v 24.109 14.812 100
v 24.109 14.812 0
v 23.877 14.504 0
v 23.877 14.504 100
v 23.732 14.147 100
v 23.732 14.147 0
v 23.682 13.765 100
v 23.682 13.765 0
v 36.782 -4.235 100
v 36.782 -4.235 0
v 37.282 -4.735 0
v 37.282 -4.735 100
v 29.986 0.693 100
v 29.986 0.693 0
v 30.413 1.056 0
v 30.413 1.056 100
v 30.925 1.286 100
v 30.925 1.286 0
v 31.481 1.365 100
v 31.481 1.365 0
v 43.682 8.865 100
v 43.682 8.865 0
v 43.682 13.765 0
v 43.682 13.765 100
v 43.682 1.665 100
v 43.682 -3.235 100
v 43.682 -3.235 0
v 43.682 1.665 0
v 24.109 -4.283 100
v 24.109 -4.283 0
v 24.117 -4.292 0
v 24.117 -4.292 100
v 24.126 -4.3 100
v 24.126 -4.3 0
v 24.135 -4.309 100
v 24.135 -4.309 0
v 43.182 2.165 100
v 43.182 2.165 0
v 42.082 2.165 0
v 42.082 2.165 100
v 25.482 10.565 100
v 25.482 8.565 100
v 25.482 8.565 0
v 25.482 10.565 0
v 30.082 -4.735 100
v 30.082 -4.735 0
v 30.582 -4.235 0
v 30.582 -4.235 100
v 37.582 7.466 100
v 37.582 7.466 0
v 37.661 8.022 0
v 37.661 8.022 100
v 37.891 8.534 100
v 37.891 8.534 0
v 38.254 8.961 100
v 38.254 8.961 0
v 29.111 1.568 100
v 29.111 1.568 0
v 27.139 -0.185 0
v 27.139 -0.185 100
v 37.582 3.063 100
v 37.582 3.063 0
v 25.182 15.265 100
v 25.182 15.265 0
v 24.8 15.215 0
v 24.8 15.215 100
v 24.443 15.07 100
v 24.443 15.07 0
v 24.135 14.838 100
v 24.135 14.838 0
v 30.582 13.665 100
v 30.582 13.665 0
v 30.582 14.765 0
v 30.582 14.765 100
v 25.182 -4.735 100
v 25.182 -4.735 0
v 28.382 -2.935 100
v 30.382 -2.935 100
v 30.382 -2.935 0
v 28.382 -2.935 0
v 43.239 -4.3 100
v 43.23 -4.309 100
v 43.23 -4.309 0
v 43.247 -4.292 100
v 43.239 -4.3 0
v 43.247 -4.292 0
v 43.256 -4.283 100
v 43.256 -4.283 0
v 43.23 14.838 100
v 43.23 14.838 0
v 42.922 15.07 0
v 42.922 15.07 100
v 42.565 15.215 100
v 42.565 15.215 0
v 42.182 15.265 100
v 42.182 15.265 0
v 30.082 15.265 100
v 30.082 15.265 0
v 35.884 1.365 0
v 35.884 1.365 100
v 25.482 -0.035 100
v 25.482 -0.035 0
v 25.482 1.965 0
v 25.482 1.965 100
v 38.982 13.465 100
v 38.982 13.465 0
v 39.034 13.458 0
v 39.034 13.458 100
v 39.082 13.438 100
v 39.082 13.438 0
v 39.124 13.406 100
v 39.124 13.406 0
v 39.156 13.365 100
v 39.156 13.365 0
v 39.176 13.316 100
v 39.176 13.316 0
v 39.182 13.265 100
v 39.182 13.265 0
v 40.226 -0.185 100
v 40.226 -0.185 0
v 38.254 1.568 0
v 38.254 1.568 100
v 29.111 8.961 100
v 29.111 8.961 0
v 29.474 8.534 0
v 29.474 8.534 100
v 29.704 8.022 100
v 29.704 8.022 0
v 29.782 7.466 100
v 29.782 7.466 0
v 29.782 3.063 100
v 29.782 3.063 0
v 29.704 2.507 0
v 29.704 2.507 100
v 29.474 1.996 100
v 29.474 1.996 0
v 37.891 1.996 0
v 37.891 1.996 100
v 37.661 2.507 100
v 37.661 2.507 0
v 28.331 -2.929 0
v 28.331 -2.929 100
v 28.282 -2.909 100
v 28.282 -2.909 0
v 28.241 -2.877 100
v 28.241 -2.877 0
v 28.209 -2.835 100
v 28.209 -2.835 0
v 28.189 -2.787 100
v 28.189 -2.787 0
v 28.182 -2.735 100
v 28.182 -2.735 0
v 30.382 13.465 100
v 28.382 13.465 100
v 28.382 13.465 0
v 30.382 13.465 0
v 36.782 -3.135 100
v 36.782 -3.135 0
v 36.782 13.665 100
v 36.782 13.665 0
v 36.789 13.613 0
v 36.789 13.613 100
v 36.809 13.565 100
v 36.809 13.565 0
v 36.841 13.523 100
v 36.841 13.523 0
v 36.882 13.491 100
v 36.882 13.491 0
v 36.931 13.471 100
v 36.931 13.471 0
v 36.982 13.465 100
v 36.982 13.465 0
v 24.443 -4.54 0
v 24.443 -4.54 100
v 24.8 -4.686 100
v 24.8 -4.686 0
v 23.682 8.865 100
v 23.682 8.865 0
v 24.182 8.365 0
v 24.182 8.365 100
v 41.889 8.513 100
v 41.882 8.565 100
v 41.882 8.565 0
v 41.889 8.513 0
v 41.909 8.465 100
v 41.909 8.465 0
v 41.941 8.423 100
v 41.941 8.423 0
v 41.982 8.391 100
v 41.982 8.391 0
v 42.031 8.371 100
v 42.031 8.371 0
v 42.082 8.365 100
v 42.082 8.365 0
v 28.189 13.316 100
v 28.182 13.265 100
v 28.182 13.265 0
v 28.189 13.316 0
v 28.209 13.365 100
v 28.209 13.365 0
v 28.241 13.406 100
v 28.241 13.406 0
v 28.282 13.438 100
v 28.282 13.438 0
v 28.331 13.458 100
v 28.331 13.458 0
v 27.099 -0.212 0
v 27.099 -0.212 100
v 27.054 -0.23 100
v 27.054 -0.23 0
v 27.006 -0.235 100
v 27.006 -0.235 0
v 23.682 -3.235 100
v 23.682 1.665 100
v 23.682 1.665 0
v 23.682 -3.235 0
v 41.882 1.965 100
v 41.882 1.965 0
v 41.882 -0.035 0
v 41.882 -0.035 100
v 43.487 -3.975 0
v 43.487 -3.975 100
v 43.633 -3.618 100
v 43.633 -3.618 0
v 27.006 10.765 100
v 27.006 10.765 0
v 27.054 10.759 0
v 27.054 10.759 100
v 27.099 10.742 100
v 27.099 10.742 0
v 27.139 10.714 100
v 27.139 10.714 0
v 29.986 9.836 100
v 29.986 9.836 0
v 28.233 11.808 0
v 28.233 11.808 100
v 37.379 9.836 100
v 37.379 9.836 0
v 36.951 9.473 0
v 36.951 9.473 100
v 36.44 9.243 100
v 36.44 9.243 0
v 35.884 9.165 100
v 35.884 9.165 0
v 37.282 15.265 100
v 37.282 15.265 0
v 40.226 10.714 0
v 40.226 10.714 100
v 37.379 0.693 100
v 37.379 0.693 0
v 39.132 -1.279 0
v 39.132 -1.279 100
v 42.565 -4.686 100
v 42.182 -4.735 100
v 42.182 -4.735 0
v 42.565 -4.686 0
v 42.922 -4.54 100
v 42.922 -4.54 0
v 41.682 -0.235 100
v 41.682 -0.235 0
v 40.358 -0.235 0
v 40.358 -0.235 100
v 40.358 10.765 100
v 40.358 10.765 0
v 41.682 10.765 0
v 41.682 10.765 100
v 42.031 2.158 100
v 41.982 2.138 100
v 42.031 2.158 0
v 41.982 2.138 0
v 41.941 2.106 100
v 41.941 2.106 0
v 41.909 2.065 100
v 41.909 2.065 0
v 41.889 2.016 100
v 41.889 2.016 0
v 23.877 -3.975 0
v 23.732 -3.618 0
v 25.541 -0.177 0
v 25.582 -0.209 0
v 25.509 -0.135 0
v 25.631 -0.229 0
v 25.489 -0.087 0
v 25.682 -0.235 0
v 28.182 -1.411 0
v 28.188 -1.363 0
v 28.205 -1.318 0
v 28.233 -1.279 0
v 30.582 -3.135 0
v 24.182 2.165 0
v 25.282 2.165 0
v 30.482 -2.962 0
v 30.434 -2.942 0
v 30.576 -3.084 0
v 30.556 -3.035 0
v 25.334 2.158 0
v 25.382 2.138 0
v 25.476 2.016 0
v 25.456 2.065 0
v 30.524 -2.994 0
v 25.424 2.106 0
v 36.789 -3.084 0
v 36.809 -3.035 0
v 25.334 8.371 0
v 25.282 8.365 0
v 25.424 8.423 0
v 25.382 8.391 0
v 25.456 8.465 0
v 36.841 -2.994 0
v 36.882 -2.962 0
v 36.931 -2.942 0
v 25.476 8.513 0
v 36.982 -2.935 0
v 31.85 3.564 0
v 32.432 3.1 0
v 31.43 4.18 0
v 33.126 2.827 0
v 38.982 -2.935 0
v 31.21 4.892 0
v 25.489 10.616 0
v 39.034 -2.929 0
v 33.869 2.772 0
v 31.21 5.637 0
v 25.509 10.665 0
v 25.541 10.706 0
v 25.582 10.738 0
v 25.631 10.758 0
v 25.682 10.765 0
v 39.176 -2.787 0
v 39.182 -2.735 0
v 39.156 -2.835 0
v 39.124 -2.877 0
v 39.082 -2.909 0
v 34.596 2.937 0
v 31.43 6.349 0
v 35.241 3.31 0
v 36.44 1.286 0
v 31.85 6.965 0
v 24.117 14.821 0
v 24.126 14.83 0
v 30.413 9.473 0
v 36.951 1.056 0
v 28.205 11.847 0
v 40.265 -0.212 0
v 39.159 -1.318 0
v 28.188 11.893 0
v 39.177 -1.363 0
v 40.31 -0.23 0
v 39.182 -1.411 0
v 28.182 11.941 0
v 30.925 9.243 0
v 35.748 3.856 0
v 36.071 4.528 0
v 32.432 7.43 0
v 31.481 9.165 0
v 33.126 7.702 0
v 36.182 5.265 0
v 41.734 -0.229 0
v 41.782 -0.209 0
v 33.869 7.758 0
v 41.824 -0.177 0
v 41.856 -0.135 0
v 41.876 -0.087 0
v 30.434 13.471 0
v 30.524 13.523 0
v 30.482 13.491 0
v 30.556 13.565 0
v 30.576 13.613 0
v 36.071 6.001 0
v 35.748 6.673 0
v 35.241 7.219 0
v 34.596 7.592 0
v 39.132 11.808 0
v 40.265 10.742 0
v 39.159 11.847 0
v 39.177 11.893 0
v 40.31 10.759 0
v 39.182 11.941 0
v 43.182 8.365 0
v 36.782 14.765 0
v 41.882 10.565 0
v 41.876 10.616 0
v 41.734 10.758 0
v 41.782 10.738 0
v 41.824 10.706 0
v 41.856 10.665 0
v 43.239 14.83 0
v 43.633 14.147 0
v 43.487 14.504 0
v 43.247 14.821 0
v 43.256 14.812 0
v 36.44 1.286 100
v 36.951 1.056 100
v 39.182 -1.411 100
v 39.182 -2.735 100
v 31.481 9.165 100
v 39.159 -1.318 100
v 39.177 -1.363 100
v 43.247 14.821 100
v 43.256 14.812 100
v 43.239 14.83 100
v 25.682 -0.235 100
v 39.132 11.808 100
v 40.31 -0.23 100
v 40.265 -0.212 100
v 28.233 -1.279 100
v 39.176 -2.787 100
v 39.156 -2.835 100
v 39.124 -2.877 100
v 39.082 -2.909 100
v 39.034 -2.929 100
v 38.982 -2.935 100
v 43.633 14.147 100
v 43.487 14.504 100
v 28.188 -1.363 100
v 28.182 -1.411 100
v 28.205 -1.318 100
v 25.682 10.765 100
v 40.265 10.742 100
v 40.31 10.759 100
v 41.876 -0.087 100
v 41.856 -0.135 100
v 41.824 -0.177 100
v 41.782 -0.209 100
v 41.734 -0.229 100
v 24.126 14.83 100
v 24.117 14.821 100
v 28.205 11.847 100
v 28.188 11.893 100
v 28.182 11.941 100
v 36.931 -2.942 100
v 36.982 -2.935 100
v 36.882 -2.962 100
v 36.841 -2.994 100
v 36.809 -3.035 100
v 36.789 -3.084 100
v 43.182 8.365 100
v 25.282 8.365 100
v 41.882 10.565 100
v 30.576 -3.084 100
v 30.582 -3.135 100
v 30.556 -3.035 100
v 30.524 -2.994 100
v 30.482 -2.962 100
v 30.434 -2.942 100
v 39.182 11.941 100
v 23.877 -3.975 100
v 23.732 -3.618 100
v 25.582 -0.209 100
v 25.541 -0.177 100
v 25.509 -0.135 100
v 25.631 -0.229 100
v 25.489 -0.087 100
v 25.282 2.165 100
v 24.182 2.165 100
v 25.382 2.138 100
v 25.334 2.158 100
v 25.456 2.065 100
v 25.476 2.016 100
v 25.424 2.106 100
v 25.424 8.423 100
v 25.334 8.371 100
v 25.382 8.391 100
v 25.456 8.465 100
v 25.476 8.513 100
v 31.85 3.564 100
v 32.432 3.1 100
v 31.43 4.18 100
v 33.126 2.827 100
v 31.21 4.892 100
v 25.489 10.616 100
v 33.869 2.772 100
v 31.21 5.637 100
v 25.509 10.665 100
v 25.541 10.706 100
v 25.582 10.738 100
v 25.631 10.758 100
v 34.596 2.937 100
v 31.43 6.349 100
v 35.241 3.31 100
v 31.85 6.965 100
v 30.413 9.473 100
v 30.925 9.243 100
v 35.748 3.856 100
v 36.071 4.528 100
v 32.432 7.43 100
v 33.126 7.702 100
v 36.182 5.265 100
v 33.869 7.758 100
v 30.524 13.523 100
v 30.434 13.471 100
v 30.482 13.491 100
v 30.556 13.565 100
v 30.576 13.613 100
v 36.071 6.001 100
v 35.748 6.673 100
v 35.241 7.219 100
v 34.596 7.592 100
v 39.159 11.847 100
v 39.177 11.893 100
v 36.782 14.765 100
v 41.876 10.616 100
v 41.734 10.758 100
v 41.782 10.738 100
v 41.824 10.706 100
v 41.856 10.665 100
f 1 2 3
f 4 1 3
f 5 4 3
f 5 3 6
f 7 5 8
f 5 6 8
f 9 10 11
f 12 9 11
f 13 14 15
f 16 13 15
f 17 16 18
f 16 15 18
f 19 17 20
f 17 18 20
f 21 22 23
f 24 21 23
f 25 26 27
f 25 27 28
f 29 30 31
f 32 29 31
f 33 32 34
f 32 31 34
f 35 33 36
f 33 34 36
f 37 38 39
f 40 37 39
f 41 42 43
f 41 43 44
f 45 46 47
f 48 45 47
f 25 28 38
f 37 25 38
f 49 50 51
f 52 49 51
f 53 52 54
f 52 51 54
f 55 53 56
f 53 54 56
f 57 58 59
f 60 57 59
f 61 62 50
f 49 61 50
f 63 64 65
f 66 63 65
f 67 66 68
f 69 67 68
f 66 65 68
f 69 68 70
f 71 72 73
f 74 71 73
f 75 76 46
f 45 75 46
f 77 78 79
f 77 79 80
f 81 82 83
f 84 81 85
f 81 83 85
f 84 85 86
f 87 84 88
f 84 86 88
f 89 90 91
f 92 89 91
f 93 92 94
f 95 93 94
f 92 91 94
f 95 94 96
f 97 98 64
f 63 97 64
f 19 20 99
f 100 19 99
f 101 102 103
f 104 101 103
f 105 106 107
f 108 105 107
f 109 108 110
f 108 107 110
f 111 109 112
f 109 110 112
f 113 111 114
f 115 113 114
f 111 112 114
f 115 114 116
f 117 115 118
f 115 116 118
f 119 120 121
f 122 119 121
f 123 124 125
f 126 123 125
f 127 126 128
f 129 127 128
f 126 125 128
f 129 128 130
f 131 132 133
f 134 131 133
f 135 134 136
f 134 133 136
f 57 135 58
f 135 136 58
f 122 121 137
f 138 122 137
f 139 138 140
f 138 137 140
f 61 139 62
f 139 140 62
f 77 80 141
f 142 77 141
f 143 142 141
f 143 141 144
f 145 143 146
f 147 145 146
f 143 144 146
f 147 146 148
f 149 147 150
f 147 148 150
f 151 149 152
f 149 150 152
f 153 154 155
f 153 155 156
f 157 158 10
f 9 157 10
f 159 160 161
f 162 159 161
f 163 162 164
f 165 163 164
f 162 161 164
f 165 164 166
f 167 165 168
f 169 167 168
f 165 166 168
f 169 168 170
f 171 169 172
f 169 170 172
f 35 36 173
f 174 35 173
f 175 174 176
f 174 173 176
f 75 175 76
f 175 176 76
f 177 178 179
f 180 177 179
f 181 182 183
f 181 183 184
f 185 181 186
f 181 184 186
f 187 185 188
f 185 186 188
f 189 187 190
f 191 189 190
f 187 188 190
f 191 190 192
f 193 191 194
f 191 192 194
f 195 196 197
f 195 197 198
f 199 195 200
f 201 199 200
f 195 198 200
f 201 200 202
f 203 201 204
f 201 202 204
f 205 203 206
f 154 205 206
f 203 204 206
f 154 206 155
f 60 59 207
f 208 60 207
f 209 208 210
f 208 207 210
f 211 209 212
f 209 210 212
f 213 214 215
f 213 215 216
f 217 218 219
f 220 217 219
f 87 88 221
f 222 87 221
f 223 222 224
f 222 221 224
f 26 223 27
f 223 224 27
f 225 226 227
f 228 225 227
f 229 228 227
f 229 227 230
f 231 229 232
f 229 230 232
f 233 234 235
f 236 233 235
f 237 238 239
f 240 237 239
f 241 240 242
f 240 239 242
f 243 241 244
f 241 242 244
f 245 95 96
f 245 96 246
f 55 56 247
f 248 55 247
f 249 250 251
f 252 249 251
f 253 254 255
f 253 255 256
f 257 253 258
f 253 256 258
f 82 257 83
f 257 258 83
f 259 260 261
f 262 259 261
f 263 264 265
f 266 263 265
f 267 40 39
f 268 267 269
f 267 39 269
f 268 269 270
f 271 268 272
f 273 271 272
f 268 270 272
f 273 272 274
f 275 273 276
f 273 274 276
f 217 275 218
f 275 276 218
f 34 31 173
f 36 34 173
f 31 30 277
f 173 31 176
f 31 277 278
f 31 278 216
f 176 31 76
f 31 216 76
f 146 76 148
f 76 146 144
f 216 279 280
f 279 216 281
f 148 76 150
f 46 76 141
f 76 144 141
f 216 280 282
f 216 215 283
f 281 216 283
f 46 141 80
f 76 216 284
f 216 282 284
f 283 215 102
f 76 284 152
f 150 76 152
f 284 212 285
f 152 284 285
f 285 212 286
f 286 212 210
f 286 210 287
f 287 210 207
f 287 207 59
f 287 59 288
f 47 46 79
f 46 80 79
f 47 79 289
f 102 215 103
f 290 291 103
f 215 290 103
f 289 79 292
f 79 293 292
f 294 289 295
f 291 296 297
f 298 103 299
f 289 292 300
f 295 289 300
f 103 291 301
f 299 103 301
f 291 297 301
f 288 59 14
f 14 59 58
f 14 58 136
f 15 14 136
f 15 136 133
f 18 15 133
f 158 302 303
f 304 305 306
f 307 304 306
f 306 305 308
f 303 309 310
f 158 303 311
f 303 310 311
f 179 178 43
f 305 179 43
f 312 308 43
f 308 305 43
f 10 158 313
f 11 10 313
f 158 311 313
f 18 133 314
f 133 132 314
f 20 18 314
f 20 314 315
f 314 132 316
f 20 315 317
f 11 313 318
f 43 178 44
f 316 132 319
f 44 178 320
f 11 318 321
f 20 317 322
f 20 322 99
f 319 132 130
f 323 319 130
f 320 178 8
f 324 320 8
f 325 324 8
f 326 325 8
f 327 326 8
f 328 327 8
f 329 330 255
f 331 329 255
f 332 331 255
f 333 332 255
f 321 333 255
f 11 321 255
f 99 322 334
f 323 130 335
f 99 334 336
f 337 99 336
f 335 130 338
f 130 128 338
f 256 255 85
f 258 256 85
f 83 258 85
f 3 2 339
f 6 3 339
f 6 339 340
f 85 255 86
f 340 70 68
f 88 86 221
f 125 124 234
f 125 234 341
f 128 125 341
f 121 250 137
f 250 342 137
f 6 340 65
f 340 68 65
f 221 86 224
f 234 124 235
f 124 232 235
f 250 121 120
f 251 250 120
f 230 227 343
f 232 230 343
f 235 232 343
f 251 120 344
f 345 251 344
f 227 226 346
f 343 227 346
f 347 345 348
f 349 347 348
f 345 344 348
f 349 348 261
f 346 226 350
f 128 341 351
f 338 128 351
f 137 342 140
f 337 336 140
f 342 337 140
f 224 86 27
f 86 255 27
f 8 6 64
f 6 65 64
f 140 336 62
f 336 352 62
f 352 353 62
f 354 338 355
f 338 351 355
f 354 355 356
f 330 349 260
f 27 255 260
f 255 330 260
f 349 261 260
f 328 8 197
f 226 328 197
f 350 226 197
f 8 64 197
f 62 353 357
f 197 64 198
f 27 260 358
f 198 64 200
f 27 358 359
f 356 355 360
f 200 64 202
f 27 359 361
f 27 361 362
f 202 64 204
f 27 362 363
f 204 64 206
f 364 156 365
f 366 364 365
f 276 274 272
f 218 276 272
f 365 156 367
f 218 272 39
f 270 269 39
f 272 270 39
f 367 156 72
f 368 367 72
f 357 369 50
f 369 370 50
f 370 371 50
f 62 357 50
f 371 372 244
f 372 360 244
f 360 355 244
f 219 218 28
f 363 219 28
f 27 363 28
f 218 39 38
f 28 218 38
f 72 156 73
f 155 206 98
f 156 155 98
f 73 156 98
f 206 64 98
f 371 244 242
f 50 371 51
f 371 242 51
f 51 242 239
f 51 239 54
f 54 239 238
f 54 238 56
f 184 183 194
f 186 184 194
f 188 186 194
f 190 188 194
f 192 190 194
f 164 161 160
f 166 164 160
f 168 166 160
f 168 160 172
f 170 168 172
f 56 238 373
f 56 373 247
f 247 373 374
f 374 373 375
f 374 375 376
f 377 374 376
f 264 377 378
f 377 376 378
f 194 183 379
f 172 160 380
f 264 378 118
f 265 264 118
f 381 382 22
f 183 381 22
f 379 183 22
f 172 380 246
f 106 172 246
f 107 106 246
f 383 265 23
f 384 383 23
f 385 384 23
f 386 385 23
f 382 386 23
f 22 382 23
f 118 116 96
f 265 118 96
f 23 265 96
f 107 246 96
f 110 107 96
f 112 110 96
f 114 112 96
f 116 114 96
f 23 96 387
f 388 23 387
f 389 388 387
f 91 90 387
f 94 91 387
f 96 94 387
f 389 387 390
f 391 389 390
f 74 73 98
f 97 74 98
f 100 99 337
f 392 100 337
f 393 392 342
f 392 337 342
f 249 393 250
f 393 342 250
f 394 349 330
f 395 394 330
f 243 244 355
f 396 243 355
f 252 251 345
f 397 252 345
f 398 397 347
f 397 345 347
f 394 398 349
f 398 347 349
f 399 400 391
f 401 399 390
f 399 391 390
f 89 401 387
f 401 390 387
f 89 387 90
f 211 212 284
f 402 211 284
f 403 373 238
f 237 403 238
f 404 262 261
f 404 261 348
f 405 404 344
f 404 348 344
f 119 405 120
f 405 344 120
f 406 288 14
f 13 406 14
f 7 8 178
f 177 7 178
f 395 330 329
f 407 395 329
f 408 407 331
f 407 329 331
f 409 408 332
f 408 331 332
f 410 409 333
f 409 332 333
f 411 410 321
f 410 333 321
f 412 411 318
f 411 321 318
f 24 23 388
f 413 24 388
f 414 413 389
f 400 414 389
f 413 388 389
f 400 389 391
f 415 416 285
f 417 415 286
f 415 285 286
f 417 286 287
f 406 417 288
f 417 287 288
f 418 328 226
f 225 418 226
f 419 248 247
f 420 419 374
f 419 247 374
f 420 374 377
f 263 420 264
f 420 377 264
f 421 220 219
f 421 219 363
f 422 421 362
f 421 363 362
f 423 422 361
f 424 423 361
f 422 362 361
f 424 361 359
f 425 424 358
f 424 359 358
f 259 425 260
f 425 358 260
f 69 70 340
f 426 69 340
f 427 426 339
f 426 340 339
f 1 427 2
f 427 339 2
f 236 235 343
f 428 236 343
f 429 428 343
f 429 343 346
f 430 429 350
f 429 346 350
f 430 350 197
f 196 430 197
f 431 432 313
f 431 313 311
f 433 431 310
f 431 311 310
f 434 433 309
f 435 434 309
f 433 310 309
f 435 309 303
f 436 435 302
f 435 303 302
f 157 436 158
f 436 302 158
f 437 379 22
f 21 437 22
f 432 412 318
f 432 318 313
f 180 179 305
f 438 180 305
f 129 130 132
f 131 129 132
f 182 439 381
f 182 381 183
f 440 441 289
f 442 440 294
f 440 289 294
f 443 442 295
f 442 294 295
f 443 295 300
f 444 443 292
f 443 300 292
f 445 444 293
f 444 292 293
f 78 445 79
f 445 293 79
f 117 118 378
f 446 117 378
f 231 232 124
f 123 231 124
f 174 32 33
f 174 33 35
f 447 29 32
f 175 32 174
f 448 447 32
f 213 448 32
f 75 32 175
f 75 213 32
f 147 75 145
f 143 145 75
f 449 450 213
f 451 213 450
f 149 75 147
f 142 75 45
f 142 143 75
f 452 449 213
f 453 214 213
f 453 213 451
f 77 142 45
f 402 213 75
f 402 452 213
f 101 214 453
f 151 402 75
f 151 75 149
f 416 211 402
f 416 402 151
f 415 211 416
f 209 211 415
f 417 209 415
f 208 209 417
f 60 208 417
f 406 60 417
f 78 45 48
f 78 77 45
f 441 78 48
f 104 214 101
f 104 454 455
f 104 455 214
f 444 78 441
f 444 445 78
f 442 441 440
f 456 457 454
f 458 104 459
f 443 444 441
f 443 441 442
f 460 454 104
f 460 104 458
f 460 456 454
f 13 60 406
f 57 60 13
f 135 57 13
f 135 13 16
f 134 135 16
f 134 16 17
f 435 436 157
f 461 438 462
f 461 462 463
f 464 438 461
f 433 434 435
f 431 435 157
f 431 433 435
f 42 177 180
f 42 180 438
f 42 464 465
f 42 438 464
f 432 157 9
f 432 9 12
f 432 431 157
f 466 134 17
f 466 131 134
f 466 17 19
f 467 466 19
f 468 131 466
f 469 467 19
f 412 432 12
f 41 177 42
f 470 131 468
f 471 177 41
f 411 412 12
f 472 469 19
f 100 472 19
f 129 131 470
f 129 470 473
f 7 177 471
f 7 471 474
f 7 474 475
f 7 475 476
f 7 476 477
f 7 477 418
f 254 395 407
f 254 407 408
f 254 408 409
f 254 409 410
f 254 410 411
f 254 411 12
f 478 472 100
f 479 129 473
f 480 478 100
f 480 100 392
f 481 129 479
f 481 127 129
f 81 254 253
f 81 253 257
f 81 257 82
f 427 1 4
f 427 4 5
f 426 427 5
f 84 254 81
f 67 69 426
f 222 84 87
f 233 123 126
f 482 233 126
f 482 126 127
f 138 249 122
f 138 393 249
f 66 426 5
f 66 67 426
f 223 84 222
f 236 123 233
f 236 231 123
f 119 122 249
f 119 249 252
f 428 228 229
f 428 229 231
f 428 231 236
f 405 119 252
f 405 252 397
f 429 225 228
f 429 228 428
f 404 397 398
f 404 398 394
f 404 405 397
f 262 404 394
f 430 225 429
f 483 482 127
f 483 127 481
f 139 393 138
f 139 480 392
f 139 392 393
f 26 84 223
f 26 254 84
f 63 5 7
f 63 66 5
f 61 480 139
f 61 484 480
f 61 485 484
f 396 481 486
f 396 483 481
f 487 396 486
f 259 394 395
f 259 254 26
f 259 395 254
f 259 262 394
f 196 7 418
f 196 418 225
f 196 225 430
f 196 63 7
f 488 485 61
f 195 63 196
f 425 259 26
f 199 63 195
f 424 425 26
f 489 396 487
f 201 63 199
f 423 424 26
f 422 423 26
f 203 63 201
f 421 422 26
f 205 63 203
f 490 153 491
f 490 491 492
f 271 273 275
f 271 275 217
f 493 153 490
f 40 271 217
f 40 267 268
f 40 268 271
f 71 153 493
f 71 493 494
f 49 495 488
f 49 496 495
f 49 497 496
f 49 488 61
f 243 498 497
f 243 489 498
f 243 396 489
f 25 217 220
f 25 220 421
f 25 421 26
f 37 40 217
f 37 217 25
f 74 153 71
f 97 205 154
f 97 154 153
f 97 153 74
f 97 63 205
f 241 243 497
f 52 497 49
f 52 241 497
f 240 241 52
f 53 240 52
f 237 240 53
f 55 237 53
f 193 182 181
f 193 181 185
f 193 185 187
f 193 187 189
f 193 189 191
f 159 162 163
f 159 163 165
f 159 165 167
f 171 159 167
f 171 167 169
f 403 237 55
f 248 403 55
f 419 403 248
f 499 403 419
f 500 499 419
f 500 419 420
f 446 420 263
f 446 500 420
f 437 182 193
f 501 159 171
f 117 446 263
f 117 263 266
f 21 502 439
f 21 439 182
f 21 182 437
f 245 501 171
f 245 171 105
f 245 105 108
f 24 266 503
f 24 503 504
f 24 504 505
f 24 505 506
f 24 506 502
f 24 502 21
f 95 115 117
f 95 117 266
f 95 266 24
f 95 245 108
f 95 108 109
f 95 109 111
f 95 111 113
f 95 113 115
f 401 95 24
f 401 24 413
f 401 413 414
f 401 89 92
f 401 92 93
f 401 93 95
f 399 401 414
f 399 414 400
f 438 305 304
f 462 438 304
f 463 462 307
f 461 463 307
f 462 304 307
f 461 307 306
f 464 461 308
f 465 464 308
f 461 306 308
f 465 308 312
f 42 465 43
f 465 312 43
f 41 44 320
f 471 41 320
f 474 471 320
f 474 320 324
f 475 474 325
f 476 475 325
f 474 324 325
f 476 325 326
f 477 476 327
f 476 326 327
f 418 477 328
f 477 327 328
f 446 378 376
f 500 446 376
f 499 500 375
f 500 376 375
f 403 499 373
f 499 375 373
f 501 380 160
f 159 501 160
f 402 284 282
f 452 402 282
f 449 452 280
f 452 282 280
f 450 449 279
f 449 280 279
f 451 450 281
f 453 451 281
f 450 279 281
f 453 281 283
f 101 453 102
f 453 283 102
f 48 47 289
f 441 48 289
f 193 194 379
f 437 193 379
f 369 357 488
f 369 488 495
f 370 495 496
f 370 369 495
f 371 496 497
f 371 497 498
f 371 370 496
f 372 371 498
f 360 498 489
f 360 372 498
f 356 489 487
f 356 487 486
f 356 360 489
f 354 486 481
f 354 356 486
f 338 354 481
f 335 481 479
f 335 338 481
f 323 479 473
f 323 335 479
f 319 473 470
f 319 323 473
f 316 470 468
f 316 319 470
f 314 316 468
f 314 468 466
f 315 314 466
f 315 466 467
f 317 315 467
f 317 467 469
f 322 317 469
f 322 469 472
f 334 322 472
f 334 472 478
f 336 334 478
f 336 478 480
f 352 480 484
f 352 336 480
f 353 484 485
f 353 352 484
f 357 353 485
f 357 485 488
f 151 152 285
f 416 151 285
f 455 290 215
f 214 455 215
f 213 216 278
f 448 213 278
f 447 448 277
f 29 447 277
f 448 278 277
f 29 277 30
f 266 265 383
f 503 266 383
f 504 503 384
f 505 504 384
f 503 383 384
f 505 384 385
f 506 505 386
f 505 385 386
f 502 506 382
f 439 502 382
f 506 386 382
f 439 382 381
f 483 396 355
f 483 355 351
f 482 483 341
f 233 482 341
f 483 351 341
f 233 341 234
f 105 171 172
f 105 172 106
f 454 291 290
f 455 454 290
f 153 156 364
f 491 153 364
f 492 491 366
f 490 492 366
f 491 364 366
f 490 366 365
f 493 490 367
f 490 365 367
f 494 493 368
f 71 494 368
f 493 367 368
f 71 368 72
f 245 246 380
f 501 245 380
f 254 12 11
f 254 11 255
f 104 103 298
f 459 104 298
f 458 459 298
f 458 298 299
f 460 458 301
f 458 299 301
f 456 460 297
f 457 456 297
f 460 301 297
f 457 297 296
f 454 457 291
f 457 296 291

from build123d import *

# Parameters (mm, degrees)
F0_R     = 2.5
F1_DEPTH = 100


with BuildPart() as f1:
    # F0 (on Top) → F1 (new body)
    with BuildSketch(Plane.XY):
        with BuildLine():
            Line((30.582384, 13.664589), (30.582384, 14.764589))
            Line((30.582384, 14.764589), (30.082384, 15.264589))
            Line((30.082384, 15.264589), (25.182384, 15.264589))
            ThreePointArc((25.182384, 15.264589), (24.616801, 15.153875), (24.134708, 14.838077))
            ThreePointArc((24.134708, 14.838077), (24.121724, 14.825249), (24.108896, 14.812265))
            ThreePointArc((24.108896, 14.812265), (23.793098, 14.330172), (23.682384, 13.764589))
            Line((23.682384, 13.764589), (23.682384, 8.864589))
            Line((23.682384, 8.864589), (24.182384, 8.364589))
            Line((24.182384, 8.364589), (25.282384, 8.364589))
            ThreePointArc((25.282384, 8.364589), (25.423805, 8.423168), (25.482384, 8.564589))
            Line((25.482384, 8.564589), (25.482384, 10.564589))
            ThreePointArc((25.482384, 10.564589), (25.540962, 10.70601), (25.682384, 10.764589))
            Line((25.682384, 10.764589), (27.006344, 10.764589))
            ThreePointArc((27.006344, 10.764589), (27.07742, 10.751533), (27.139217, 10.714071))
            Line((27.139217, 10.714071), (29.111111, 8.961276))
            ThreePointArc((29.111111, 8.961276), (29.606864, 8.285769), (29.782384, 7.466457))
            Line((29.782384, 7.466457), (29.782384, 5.264589))
            Line((29.782384, 5.264589), (29.782384, 3.062721))
            ThreePointArc((29.782384, 3.062721), (29.606864, 2.243409), (29.111111, 1.567903))
            Line((29.111111, 1.567903), (27.139217, -0.184893))
            ThreePointArc((27.139217, -0.184893), (27.07742, -0.222355), (27.006344, -0.235411))
            Line((27.006344, -0.235411), (25.682384, -0.235411))
            ThreePointArc((25.682384, -0.235411), (25.540962, -0.176832), (25.482384, -0.035411))
            Line((25.482384, -0.035411), (25.482384, 1.964589))
            ThreePointArc((25.482384, 1.964589), (25.423805, 2.10601), (25.282384, 2.164589))
            Line((25.282384, 2.164589), (24.182384, 2.164589))
            Line((24.182384, 2.164589), (23.682384, 1.664589))
            Line((23.682384, 1.664589), (23.682384, -3.235411))
            ThreePointArc((23.682384, -3.235411), (23.793098, -3.800994), (24.108896, -4.283086))
            ThreePointArc((24.108896, -4.283086), (24.121724, -4.296071), (24.134708, -4.308899))
            ThreePointArc((24.134708, -4.308899), (24.616801, -4.624697), (25.182384, -4.735411))
            Line((25.182384, -4.735411), (30.082384, -4.735411))
            Line((30.082384, -4.735411), (30.582384, -4.235411))
            Line((30.582384, -4.235411), (30.582384, -3.135411))
            ThreePointArc((30.582384, -3.135411), (30.523805, -2.99399), (30.382384, -2.935411))
            Line((30.382384, -2.935411), (28.382384, -2.935411))
            ThreePointArc((28.382384, -2.935411), (28.240962, -2.876832), (28.182384, -2.735411))
            Line((28.182384, -2.735411), (28.182384, -1.411451))
            ThreePointArc((28.182384, -1.411451), (28.195439, -1.340375), (28.232902, -1.278578))
            Line((28.232902, -1.278578), (29.985697, 0.693317))
            ThreePointArc((29.985697, 0.693317), (30.661204, 1.189069), (31.480516, 1.364589))
            Line((31.480516, 1.364589), (33.682384, 1.364589))
            Line((33.682384, 1.364589), (35.884252, 1.364589))
            ThreePointArc((35.884252, 1.364589), (36.703564, 1.189069), (37.37907, 0.693317))
            Line((37.37907, 0.693317), (39.131866, -1.278578))
            ThreePointArc((39.131866, -1.278578), (39.169328, -1.340375), (39.182384, -1.411451))
            Line((39.182384, -1.411451), (39.182384, -2.735411))
            ThreePointArc((39.182384, -2.735411), (39.123805, -2.876832), (38.982384, -2.935411))
            Line((38.982384, -2.935411), (36.982384, -2.935411))
            ThreePointArc((36.982384, -2.935411), (36.840962, -2.99399), (36.782384, -3.135411))
            Line((36.782384, -3.135411), (36.782384, -4.235411))
            Line((36.782384, -4.235411), (37.282384, -4.735411))
            Line((37.282384, -4.735411), (42.182384, -4.735411))
            ThreePointArc((42.182384, -4.735411), (42.747967, -4.624697), (43.230059, -4.308899))
            ThreePointArc((43.230059, -4.308899), (43.243044, -4.296071), (43.255872, -4.283086))
            ThreePointArc((43.255872, -4.283086), (43.57167, -3.800994), (43.682384, -3.235411))
            Line((43.682384, -3.235411), (43.682384, 1.664589))
            Line((43.682384, 1.664589), (43.182384, 2.164589))
            Line((43.182384, 2.164589), (42.082384, 2.164589))
            ThreePointArc((42.082384, 2.164589), (41.940962, 2.10601), (41.882384, 1.964589))
            Line((41.882384, 1.964589), (41.882384, -0.035411))
            ThreePointArc((41.882384, -0.035411), (41.823805, -0.176832), (41.682384, -0.235411))
            Line((41.682384, -0.235411), (40.358424, -0.235411))
            ThreePointArc((40.358424, -0.235411), (40.287348, -0.222355), (40.225551, -0.184893))
            Line((40.225551, -0.184893), (38.253656, 1.567903))
            ThreePointArc((38.253656, 1.567903), (37.757904, 2.243409), (37.582384, 3.062721))
            Line((37.582384, 3.062721), (37.582384, 5.264589))
            Line((37.582384, 5.264589), (37.582384, 7.466457))
            ThreePointArc((37.582384, 7.466457), (37.757904, 8.285769), (38.253656, 8.961276))
            Line((38.253656, 8.961276), (40.225551, 10.714071))
            ThreePointArc((40.225551, 10.714071), (40.287348, 10.751533), (40.358424, 10.764589))
            Line((40.358424, 10.764589), (41.682384, 10.764589))
            ThreePointArc((41.682384, 10.764589), (41.823805, 10.70601), (41.882384, 10.564589))
            Line((41.882384, 10.564589), (41.882384, 8.564589))
            ThreePointArc((41.882384, 8.564589), (41.940962, 8.423168), (42.082384, 8.364589))
            Line((42.082384, 8.364589), (43.182384, 8.364589))
            Line((43.182384, 8.364589), (43.682384, 8.864589))
            Line((43.682384, 8.864589), (43.682384, 13.764589))
            ThreePointArc((43.682384, 13.764589), (43.57167, 14.330172), (43.255872, 14.812265))
            ThreePointArc((43.255872, 14.812265), (43.243044, 14.825249), (43.230059, 14.838077))
            ThreePointArc((43.230059, 14.838077), (42.747967, 15.153875), (42.182384, 15.264589))
            Line((42.182384, 15.264589), (37.282384, 15.264589))
            Line((37.282384, 15.264589), (36.782384, 14.764589))
            Line((36.782384, 14.764589), (36.782384, 13.664589))
            ThreePointArc((36.782384, 13.664589), (36.840962, 13.523168), (36.982384, 13.464589))
            Line((36.982384, 13.464589), (38.982384, 13.464589))
            ThreePointArc((38.982384, 13.464589), (39.123805, 13.40601), (39.182384, 13.264589))
            Line((39.182384, 13.264589), (39.182384, 11.940629))
            ThreePointArc((39.182384, 11.940629), (39.169328, 11.869553), (39.131866, 11.807756))
            Line((39.131866, 11.807756), (37.37907, 9.835861))
            ThreePointArc((37.37907, 9.835861), (36.703564, 9.340109), (35.884252, 9.164589))
            Line((35.884252, 9.164589), (33.682384, 9.164589))
            Line((33.682384, 9.164589), (31.480516, 9.164589))
            ThreePointArc((31.480516, 9.164589), (30.661204, 9.340109), (29.985697, 9.835861))
            Line((29.985697, 9.835861), (28.232902, 11.807756))
            ThreePointArc((28.232902, 11.807756), (28.195439, 11.869553), (28.182384, 11.940629))
            Line((28.182384, 11.940629), (28.182384, 13.264589))
            ThreePointArc((28.182384, 13.264589), (28.240962, 13.40601), (28.382384, 13.464589))
            Line((28.382384, 13.464589), (30.382384, 13.464589))
            ThreePointArc((30.382384, 13.464589), (30.523805, 13.523168), (30.582384, 13.664589))
        make_face()
        with Locations((33.682384, 5.264589)):
            Circle(F0_R, mode=Mode.SUBTRACT)
    extrude(amount=F1_DEPTH)


solid = f1.part
